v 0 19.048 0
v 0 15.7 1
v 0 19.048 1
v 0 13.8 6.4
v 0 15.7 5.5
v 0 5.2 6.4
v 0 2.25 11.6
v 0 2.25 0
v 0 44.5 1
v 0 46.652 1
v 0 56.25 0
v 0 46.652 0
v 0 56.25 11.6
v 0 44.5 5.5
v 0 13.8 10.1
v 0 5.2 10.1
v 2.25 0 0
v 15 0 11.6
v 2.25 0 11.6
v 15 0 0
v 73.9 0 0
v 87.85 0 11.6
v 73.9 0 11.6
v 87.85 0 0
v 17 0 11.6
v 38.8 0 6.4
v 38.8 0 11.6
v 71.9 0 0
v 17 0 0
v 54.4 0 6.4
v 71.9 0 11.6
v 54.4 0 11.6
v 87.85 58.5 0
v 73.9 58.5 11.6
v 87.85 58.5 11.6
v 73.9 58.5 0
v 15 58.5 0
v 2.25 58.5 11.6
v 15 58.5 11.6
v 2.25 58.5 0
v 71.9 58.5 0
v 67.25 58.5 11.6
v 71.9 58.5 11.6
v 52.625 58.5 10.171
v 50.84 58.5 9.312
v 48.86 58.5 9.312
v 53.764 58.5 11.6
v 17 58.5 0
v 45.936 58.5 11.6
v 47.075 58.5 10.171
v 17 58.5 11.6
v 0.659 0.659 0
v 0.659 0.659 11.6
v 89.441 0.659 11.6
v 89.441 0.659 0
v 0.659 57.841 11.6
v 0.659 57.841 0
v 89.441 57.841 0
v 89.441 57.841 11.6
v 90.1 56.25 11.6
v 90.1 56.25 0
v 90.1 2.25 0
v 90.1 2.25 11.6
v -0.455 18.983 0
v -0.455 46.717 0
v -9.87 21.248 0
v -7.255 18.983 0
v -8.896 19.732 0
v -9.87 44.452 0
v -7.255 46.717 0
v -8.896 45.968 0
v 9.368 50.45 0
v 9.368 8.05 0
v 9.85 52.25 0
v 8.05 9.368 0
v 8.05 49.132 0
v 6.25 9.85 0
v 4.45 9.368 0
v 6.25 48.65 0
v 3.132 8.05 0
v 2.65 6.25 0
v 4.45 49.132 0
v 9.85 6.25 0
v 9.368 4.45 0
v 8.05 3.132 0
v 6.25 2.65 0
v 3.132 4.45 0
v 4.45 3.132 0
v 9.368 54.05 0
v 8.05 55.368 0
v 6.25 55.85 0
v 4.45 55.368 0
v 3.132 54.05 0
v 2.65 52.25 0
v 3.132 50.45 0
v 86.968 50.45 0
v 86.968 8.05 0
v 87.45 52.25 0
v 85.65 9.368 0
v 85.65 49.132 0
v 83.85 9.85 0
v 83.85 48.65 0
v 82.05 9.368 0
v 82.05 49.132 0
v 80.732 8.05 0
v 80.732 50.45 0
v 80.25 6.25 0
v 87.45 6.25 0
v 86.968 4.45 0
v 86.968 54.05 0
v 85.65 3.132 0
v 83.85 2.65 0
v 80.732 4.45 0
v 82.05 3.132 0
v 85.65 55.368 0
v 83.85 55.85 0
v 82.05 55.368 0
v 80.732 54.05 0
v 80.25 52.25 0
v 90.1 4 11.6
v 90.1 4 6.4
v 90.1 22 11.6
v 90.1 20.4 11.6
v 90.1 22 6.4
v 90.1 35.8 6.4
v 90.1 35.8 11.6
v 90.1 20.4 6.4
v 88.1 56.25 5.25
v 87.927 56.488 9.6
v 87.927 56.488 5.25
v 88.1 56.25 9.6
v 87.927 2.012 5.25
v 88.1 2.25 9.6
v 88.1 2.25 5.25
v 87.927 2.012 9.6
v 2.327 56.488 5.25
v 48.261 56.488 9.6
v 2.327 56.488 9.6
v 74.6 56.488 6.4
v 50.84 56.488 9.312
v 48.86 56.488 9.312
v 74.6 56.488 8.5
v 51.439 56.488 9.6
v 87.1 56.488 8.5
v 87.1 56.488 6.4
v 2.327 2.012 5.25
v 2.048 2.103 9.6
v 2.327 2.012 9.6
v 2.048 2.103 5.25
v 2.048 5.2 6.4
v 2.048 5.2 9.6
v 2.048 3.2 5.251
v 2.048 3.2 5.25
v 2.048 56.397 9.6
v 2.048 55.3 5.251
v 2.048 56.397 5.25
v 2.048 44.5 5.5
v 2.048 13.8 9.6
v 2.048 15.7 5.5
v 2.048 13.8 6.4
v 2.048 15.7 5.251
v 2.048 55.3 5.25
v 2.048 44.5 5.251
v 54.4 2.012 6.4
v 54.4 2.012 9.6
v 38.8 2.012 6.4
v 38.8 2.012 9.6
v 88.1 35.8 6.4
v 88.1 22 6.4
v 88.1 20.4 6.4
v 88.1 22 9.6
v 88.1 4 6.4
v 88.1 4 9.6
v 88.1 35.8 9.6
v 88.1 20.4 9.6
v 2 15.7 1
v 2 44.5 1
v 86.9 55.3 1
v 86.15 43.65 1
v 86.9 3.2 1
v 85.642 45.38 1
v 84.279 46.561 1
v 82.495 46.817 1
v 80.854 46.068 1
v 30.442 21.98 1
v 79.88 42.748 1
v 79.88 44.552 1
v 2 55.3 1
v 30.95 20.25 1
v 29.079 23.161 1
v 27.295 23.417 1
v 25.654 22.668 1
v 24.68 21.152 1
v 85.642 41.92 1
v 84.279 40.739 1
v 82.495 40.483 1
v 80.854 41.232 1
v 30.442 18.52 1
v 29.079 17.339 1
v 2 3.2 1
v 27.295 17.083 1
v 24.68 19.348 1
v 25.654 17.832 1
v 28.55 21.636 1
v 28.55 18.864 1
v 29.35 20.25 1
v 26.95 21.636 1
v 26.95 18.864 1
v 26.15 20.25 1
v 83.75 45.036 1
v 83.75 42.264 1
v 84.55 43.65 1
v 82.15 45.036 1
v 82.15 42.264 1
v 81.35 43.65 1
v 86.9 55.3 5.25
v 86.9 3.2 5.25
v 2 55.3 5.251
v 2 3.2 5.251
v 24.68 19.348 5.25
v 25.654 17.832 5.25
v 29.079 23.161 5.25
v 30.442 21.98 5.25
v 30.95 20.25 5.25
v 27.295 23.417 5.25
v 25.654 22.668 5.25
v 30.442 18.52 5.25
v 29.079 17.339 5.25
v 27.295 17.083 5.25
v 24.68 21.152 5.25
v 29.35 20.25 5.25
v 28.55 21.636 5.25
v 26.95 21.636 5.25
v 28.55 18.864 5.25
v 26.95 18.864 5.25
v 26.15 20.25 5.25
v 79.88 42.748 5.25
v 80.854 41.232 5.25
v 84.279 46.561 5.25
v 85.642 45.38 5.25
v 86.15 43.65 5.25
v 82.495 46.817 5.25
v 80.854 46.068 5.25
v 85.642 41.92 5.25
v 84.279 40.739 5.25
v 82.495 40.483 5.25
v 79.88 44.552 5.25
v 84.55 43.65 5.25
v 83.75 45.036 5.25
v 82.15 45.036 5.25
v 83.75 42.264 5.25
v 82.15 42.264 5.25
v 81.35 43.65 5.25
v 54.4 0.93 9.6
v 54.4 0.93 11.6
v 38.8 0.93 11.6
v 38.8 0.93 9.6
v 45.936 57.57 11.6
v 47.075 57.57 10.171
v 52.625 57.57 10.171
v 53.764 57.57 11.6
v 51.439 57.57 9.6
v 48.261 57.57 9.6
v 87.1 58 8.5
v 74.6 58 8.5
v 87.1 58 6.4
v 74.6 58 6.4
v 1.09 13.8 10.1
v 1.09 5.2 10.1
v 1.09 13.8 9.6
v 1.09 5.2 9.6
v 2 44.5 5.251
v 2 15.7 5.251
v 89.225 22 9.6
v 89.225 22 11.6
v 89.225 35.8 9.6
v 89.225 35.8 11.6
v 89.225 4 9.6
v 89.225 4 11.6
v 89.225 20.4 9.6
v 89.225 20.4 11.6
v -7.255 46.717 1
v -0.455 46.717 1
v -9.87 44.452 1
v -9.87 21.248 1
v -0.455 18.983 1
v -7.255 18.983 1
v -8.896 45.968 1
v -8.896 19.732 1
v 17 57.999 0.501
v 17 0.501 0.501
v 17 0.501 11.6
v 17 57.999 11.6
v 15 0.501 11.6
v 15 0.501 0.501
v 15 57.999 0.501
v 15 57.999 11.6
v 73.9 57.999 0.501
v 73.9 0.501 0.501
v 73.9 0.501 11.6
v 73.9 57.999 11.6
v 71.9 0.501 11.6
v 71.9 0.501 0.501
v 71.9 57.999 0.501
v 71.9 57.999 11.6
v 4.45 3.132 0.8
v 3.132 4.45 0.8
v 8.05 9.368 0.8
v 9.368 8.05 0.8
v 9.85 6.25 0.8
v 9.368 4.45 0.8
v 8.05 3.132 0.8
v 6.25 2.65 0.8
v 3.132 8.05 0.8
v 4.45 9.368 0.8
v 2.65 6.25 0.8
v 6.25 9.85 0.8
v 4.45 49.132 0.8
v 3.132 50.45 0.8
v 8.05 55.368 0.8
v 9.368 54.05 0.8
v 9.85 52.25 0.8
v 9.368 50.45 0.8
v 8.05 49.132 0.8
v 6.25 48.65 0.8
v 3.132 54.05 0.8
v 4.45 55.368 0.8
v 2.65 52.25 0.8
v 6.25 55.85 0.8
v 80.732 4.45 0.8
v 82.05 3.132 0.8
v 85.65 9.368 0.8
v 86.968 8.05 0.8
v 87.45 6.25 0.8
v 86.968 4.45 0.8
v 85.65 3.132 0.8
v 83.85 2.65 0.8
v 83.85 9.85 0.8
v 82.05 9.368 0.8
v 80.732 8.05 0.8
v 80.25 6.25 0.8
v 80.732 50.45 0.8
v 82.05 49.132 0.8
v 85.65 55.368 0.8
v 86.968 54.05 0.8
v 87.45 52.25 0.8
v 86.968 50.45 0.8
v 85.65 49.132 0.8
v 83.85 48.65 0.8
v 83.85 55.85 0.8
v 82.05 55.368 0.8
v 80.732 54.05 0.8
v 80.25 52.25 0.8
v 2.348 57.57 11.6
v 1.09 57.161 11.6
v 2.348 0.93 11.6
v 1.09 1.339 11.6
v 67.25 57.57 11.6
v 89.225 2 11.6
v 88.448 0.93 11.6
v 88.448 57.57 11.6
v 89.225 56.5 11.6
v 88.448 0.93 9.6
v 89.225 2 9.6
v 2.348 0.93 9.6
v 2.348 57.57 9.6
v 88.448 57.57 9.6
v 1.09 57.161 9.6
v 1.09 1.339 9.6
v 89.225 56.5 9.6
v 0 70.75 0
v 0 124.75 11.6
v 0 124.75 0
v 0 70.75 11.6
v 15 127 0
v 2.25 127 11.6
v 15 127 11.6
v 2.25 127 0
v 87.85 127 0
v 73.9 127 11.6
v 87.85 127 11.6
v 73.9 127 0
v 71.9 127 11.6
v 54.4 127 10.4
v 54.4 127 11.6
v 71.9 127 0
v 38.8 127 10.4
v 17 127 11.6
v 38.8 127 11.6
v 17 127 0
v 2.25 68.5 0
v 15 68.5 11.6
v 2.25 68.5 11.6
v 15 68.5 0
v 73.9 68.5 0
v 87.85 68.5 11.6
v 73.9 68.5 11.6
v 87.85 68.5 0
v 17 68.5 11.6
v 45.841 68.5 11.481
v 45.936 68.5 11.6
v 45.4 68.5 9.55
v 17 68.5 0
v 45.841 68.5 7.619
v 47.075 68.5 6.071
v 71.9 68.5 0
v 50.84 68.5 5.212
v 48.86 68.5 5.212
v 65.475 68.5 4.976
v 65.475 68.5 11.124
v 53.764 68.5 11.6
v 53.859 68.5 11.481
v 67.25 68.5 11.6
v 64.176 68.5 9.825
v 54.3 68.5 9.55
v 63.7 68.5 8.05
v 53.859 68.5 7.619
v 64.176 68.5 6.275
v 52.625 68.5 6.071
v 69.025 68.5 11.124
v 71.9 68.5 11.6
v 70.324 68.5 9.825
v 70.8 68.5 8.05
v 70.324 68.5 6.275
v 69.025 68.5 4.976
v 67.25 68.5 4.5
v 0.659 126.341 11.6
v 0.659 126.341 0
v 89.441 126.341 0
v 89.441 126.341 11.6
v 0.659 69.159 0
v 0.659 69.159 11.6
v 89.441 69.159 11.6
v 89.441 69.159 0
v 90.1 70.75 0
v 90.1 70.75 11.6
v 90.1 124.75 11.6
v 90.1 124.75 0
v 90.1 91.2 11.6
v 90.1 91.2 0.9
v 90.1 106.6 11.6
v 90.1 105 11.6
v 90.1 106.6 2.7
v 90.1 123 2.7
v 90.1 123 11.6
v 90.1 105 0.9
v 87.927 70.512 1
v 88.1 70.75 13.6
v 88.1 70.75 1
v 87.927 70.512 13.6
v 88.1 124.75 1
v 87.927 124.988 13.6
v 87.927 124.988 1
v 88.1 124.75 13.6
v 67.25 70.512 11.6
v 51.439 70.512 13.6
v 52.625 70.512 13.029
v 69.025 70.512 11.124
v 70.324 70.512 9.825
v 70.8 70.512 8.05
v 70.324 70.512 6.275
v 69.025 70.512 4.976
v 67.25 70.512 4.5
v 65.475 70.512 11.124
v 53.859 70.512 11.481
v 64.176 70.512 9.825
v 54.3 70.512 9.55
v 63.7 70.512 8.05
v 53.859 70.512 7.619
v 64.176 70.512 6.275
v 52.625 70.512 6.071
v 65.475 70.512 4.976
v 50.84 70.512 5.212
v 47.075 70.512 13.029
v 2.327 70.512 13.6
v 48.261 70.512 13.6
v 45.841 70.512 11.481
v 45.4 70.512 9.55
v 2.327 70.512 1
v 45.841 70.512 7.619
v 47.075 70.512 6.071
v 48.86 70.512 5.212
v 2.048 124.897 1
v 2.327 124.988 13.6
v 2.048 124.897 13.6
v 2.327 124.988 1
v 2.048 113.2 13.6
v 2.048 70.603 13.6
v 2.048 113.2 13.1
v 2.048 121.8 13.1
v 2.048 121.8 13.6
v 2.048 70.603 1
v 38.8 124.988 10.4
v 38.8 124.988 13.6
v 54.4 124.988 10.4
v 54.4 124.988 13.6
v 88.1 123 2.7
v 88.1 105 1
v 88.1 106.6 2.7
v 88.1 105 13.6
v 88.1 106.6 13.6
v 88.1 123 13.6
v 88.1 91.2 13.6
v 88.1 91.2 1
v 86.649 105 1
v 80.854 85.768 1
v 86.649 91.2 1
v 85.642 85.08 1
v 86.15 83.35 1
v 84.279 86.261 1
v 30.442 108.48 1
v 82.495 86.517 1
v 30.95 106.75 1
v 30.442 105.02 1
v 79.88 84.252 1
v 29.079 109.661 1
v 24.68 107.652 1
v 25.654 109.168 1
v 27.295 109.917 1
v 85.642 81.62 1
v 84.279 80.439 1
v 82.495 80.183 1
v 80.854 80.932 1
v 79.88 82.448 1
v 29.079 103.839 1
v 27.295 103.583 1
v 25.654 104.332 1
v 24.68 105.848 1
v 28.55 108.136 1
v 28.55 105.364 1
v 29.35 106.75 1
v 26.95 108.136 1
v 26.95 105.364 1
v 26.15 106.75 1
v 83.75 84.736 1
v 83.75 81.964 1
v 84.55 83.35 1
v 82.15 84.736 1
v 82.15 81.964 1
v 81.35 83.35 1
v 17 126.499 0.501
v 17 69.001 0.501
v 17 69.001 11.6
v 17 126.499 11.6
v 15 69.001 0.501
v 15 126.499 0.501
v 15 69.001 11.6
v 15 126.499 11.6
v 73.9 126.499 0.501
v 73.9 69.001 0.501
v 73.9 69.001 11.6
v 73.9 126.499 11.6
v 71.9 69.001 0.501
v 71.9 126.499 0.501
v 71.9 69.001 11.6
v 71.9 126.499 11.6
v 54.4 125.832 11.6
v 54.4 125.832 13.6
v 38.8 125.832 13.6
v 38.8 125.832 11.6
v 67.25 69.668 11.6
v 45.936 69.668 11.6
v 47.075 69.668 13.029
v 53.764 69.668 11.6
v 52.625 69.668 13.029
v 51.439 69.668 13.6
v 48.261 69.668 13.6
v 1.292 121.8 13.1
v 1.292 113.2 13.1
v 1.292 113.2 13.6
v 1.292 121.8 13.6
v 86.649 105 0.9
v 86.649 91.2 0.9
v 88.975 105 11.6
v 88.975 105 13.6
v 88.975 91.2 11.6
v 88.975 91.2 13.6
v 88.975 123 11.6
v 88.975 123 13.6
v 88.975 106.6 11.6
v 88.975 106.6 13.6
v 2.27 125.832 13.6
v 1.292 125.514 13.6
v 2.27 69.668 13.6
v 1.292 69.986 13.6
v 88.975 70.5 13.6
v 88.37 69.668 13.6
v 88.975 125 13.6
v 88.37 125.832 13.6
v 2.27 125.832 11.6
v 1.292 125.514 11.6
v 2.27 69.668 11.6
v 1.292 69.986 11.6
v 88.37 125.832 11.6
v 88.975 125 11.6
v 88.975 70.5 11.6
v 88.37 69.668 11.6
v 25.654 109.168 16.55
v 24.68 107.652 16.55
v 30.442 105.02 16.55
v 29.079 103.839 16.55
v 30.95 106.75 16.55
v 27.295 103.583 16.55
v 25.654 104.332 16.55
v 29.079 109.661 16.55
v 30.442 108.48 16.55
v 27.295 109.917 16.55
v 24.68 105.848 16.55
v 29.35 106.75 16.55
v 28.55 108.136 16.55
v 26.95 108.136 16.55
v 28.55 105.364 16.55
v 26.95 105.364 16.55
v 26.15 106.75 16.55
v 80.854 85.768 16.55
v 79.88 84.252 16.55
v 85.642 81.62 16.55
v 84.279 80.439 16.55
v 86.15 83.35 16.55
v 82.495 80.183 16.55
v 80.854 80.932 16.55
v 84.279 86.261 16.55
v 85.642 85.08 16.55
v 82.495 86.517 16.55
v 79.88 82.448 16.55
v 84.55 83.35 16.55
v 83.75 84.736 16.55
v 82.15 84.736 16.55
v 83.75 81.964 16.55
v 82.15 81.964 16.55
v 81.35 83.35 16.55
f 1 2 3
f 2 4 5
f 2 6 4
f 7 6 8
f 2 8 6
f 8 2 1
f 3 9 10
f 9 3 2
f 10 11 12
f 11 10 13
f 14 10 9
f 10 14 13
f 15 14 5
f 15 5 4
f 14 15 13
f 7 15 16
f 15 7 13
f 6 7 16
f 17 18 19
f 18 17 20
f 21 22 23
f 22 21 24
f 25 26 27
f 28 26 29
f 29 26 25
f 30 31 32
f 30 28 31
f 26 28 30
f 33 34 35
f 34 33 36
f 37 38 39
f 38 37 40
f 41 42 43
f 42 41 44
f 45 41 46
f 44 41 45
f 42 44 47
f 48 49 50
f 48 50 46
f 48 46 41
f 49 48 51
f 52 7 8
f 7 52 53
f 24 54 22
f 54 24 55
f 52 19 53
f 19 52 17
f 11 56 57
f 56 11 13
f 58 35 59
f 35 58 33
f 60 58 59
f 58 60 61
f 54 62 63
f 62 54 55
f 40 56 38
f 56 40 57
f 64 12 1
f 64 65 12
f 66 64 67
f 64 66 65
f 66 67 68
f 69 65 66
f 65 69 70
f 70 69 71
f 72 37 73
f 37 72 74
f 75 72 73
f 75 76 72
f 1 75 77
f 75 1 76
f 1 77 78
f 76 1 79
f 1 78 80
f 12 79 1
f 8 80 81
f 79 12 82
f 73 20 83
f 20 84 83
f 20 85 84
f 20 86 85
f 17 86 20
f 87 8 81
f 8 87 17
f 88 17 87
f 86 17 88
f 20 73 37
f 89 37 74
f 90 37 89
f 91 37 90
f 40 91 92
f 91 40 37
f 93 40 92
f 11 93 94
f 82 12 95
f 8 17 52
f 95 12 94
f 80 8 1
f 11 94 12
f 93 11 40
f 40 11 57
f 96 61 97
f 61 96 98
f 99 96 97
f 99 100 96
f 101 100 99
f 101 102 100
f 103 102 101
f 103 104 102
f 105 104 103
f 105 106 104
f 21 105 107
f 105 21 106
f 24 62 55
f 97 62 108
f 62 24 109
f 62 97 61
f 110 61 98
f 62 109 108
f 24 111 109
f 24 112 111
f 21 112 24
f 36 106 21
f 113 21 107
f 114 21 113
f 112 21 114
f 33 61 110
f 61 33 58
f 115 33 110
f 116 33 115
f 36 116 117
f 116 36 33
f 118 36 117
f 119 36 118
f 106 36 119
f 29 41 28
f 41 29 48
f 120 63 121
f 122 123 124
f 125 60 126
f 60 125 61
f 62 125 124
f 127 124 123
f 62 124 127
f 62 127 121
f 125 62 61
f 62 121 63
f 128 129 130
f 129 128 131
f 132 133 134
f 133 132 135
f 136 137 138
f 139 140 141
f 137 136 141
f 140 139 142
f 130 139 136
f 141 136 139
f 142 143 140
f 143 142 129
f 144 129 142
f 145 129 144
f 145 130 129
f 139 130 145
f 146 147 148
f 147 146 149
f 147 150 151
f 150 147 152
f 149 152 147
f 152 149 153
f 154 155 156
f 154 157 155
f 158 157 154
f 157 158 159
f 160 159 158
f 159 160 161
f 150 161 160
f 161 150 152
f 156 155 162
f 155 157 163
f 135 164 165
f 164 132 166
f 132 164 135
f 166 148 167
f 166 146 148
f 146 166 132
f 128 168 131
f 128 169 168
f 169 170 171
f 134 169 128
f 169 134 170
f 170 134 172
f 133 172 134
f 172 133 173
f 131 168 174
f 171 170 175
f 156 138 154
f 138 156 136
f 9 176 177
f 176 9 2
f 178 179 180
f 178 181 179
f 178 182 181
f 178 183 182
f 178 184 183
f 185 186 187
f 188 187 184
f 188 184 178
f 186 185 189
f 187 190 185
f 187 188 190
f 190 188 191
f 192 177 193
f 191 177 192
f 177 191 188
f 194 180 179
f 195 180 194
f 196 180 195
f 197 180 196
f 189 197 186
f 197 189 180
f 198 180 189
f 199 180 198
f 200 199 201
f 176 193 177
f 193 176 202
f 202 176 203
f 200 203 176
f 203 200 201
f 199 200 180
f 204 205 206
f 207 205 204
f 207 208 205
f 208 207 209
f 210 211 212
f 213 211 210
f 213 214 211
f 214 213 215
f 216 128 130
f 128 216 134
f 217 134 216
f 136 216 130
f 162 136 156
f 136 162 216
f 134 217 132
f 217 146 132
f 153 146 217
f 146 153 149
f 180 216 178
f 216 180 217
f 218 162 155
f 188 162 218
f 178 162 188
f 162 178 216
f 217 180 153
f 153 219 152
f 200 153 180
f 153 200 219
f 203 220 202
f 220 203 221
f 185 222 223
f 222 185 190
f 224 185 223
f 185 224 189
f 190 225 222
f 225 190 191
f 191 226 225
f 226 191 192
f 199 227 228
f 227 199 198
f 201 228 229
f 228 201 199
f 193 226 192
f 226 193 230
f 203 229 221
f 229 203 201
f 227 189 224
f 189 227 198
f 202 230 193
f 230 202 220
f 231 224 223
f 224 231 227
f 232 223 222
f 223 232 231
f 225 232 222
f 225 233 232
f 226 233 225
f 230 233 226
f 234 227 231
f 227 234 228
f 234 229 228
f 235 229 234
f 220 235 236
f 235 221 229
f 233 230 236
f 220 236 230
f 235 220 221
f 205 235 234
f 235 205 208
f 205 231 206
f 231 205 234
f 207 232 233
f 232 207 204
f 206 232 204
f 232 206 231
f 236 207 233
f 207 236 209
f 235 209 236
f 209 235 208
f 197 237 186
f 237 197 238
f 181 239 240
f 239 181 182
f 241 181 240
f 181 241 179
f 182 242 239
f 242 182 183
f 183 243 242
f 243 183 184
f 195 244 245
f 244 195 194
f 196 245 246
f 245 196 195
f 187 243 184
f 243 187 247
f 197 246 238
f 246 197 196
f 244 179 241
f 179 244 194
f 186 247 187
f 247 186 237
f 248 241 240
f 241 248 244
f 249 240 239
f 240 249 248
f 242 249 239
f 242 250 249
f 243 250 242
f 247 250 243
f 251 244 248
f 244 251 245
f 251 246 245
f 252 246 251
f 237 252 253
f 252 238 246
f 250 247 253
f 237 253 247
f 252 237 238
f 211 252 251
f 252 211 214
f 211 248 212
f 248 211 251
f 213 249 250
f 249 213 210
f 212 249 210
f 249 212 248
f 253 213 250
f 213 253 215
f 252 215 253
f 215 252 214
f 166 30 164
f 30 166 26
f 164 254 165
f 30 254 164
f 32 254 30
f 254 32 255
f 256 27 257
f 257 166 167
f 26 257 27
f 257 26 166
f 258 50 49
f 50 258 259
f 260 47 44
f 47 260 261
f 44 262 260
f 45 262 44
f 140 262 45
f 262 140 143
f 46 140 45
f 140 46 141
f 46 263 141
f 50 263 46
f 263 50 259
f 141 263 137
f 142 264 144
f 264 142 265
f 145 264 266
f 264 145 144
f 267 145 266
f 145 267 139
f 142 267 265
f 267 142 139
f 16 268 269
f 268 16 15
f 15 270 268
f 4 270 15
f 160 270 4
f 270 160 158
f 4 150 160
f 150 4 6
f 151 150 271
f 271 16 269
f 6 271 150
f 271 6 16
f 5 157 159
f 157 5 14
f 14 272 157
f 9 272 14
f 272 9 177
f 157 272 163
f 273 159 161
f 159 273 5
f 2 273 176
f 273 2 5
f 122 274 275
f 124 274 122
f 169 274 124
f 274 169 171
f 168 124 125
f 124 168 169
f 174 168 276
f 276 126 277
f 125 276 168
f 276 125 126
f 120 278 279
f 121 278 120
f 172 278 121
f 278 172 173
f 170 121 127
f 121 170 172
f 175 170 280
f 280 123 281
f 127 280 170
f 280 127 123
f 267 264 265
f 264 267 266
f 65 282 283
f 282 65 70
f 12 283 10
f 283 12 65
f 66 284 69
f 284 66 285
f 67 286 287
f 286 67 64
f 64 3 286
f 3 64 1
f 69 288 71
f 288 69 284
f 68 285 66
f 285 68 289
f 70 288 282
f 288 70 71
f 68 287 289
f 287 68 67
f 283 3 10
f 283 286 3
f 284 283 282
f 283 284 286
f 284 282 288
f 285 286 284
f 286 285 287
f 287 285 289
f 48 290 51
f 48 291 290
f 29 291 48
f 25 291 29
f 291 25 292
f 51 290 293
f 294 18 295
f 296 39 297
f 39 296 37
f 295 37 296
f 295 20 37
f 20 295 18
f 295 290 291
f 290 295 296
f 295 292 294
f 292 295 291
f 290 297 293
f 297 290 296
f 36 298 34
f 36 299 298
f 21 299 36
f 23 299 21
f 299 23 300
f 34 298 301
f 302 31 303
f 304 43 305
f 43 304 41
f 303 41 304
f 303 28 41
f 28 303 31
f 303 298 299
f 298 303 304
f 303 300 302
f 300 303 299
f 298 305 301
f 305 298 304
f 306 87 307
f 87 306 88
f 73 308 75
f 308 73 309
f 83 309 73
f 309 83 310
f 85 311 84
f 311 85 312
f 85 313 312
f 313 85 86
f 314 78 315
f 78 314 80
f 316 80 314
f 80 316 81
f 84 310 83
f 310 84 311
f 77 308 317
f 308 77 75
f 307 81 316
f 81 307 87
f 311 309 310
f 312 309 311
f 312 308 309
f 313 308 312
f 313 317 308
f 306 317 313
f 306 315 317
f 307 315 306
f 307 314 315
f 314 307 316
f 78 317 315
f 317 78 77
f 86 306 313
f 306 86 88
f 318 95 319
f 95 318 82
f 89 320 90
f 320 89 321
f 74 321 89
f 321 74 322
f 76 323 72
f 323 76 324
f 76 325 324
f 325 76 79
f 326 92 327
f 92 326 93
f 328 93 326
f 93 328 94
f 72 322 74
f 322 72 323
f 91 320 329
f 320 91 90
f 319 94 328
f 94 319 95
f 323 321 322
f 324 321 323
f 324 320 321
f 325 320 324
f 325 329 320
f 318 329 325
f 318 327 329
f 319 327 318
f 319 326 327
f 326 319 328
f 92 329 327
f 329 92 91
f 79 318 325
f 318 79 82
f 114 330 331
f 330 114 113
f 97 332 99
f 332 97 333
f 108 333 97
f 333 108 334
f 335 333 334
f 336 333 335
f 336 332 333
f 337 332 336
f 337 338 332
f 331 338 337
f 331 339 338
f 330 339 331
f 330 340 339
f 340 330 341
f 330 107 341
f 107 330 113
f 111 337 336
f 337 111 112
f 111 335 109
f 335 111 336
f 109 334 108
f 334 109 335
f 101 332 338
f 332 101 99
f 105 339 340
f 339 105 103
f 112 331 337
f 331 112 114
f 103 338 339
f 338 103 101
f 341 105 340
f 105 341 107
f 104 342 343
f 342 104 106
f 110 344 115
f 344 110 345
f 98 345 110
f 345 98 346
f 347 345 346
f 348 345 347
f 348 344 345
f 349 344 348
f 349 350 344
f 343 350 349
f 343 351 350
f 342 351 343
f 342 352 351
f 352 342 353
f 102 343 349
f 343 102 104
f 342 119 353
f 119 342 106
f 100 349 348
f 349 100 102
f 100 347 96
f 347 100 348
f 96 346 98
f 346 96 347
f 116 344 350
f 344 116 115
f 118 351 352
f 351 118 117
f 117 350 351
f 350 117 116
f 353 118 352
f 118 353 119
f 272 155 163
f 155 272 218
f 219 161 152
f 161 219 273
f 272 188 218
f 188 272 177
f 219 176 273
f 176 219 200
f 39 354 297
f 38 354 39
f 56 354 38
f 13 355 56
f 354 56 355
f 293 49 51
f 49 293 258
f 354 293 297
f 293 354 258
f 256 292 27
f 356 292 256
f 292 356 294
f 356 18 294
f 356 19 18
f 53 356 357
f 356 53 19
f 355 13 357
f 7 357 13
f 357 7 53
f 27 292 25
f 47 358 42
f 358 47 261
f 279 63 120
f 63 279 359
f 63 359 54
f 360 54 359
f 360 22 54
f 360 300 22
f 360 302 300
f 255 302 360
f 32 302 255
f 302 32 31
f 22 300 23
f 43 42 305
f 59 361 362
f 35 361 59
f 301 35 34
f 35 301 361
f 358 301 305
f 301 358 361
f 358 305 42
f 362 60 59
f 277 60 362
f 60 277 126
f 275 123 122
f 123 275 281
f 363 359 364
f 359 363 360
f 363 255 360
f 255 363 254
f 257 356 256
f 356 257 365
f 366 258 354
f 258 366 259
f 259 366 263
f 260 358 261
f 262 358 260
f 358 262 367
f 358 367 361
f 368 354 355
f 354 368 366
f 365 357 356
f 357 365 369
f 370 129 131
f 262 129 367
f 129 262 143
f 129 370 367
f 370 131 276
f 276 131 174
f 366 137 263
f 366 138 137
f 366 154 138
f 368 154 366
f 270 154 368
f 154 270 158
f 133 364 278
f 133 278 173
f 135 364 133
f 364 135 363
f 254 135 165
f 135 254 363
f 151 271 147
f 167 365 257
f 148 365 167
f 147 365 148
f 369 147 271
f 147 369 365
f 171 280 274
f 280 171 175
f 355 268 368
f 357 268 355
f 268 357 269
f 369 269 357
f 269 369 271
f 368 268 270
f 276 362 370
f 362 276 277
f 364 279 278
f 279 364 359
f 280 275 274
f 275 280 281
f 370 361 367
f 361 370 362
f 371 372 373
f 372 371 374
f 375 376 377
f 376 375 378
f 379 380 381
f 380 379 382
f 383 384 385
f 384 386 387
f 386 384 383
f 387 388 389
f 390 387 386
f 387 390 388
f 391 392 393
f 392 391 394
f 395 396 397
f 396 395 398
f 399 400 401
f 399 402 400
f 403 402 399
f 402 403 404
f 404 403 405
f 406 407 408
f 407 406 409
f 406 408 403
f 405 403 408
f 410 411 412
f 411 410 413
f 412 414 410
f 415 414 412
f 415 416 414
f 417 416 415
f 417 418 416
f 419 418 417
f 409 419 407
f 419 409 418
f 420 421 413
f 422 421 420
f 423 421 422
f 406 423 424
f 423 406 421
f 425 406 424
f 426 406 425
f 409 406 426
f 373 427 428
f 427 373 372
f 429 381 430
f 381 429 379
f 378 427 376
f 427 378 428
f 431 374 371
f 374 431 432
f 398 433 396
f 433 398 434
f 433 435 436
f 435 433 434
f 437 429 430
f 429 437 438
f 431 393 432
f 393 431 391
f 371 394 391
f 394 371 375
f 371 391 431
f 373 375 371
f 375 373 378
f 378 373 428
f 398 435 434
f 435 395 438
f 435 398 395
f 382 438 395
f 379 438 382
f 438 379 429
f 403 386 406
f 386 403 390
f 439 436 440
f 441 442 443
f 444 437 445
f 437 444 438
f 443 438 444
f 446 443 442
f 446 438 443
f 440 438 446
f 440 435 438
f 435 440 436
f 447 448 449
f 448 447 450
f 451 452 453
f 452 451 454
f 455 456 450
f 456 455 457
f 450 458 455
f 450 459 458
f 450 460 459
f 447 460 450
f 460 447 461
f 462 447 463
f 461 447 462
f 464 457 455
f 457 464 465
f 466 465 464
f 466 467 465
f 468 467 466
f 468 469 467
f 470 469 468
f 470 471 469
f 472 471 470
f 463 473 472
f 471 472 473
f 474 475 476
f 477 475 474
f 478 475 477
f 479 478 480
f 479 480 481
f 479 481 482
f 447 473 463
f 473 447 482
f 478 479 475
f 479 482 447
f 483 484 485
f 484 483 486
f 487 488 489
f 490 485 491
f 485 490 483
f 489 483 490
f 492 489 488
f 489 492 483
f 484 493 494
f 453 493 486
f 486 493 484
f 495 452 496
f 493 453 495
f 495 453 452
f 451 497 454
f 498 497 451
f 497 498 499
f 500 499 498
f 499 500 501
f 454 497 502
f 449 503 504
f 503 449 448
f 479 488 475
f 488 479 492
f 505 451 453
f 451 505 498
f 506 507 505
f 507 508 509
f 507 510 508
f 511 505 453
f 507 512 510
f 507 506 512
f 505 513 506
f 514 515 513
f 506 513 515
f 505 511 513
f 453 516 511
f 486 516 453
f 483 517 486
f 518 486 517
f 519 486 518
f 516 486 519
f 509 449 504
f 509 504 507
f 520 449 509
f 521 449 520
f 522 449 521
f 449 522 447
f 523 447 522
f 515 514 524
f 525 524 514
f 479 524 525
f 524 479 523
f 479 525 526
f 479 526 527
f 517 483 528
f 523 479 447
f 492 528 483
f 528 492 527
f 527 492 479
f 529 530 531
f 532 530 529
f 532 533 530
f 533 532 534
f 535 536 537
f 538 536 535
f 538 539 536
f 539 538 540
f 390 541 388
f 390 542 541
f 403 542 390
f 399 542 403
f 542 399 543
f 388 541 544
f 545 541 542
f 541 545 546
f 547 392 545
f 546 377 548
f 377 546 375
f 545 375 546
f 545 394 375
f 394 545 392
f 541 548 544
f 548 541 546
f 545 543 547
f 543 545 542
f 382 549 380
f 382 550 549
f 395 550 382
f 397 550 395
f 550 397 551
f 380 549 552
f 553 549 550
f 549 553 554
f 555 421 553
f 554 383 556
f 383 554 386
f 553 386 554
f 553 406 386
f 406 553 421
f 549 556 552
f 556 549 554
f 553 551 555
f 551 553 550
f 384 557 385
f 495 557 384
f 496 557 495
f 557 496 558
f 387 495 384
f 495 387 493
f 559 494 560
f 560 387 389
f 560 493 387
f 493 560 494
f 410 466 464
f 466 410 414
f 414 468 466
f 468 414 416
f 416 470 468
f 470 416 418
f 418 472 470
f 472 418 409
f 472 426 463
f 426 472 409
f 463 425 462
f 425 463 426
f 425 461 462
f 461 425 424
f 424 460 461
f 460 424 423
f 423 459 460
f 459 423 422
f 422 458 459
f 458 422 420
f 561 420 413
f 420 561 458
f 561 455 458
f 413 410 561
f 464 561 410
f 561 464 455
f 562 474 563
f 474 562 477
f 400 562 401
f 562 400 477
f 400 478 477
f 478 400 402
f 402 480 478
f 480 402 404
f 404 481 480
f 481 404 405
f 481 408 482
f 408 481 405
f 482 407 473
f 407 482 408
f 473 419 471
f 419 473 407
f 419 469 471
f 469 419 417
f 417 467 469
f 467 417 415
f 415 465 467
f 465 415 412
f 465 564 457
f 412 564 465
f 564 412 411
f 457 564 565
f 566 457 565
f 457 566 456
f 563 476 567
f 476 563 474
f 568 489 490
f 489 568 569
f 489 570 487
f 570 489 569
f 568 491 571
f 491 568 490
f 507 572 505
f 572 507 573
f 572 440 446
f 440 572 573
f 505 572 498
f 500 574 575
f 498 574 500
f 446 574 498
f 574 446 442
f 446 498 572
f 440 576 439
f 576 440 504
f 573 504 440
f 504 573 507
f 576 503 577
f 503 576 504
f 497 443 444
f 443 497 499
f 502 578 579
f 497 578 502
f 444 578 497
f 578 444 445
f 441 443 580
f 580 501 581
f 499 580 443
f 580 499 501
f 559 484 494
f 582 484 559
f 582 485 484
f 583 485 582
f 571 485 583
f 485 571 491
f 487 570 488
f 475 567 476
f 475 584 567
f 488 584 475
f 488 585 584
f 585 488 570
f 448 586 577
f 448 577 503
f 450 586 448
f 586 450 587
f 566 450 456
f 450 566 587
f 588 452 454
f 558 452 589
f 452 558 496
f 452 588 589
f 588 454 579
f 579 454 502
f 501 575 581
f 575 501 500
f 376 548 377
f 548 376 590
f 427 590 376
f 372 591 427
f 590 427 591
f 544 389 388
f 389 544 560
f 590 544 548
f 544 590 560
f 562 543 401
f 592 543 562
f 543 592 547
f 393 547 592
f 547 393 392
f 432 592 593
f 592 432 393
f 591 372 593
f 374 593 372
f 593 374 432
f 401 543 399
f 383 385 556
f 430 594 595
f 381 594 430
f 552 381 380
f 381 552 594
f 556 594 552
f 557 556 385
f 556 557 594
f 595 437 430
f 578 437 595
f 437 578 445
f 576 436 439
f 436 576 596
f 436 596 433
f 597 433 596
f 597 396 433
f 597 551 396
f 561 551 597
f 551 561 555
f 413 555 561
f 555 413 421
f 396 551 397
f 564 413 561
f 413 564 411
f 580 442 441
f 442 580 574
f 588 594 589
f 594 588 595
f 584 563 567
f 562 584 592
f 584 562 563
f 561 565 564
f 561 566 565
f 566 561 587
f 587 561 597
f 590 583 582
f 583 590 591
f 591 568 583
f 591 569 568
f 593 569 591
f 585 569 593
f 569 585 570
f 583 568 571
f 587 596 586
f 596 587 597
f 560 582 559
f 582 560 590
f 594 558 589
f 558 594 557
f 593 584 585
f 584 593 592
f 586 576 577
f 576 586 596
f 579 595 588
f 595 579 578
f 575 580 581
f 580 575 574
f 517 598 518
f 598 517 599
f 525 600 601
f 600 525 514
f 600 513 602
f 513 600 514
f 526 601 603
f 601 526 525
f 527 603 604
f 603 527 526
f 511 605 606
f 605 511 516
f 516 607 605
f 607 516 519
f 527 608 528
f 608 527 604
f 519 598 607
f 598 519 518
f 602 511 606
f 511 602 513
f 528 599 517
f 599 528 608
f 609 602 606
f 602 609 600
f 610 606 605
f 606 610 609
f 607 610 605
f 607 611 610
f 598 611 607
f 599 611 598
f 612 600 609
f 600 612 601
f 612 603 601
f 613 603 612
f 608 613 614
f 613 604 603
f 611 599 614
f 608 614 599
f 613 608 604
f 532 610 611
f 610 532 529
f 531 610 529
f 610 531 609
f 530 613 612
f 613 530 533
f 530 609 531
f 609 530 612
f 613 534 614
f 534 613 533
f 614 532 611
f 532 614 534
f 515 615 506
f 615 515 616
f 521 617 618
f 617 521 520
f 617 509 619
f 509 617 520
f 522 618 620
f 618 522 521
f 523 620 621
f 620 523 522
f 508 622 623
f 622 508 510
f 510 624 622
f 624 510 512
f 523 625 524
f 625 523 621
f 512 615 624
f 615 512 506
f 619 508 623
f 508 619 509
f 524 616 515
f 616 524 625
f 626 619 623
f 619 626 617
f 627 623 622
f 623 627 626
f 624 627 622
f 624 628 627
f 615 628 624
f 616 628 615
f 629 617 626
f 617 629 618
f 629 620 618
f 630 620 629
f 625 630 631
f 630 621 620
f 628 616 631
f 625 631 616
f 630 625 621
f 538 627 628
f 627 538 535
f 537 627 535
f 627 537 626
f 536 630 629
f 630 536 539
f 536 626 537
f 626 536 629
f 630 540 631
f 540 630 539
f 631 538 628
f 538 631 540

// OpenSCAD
// file: lib_metric_sizes.scad
m2   = 2.8;
m2_5 = 3.2;
m3   = 3.6;
m4   = 4.8;
m5   = 5.6;
m6   = 6.4;
// file: lib_nuts.scad
include <lib_metric_sizes.scad>

m2_nut = [5.2, 1.7];
m3_nut = [6.8, 2.3];
m4_nut = [8.4, 2.8];

m2_flat_nut = [5.2, 2.0];
m3_flat_nut = [6.8, 2.0];
m4_flat_nut = [8.4, 2.0];

//m2_nylon_nut = [, ];
//m2_5_nylon_nut = [, ];
//m3_nylon_nut = [, ];
m4_nylon_nut = [8.4, 3.3];
m5_nylon_nut = [10.0, 4.0];
m6_nylon_nut = [12.4, 5.0];
// file: lib_self_tapping_screws.scad
include <lib_metric_sizes.scad>

m3_st_roundhead = [7.2, 2.0];
m3_st_flathead = [7.2, 0];
// file: lib_machine_screws.scad
include <lib_metric_sizes.scad>

m2x12_shaft = [m2, 12.0];
m2x19_shaft = [m2, 19.0];
m3x12_shaft = [m3, 12.0];
m3x17_shaft = [m3, 17.0];
m3x19_shaft = [m3, 19.0];
m4x12_shaft = [m4, 12.0];
m4x25_shaft = [m4, 25.0];

m2_roundhead = [4.0, 1.0];
m3_roundhead = [5.6, 1.7];
m4_roundhead = [7.2, 2.3];

m2_flathead = [4.0, 1.0];
m3_flathead = [5.6, 1.0];
m4_flathead = [7.2, 1.0];
// file: lib_gadgets.scad
include <lib_machine_screws.scad>
include <lib_self_tapping_screws.scad>
include <lib_nuts.scad>

module stud(shaft, self_tapping=false)
{
	ds = self_tapping ? shaft[0]-0.4 : shaft[0];
	
	cylinder(h=shaft[1], d=ds);
}

module bolt(head, shaft, countersink=false, self_tapping=false) {
	ds = self_tapping ? shaft[0]-0.4 : shaft[0];
	
	cylinder(h=head[1], d=head[0]);
	cylinder(h=shaft[1]+head[1], d=ds);
	if (countersink == true) {
		translate([0, 0, head[1]]) {
			cylinder(h=head[0], d1=head[0], d2=0);
		}
	}
}

module nut(head, countersink=false) {
	cylinder(h=head[1], d=head[0], $fn=6);
	if (countersink == true) {
		translate([0, 0, head[1]]) {
			cylinder(h=head[0], d1=head[0], d2=0, $fn=6);
		}
	}
}

module post(pos, radius, height) {
	translate([pos[0], pos[1], 0]) { 
		cylinder(h=height, r=radius); 
	}
}

module spacer(pos, outer_r, inner_r, height) {
	translate([pos[0], pos[1], 0]) { 
		difference() {
			cylinder(h=height, r=outer_r); 
			if (inner_r > 0) {
				cylinder(h=height+0.0001, r=inner_r); 
			}
		}
	}
}

module grid(size, xx, yy) {
	if (size > 0) {
		for (x = [0 : size : xx] ) {
			translate([x, 0, 0]) cube([0.8, yy, 0.4]);
		}
		for (y = [0 : size : yy] ) {
			translate([0, y, 0]) cube([xx, 0.8, 0.4]);
		}
	}
}
// file: lib_soft.scad
/** 
 * An OpenSCAD library for creating shapes with rounded edges
 *
 * @author Paul Generes <paul.generes@gmail.com>
 * @example soft_example.scad
 */
 
module soft_cube(size=[1, 1, 1], center=false, cr=1) {
	tr = [cr, cr, cr];

    translate(tr) {
        minkowski() {
            sphere(cr);
            cube([size[0]-2*cr, size[1]-2*cr, size[2]-2*cr], center);
        }
    }
}

module softxyz_cube(size=1, center=false, cr=[1, 1, 1]) {
	tr = cr;

    translate(tr) {
        minkowski() {
			scale(cr) {
				sphere(1);
			}
            cube([size[0]-2*cr[0], size[1]-2*cr[1], size[2]-2*cr[2]], center);
        }
    }
}

module softz_cube(size=1, center=false, cr=1) {
	tr = [cr, cr, 0];

    translate(tr) {
        minkowski() {
			cylinder(h=0.00001, r=cr);
			cube([size[0]-2*cr, size[1]-2*cr, size[2]-0.00001], center);
        }
    }
}
// file: lib_raspi_b_enclosure.scad
// Raspberry Pi Model B Enclosure Library

/*
Board: 85 x 54 x 1.5
Right:
	RJ45: 15.9 x 13.6 @ 2, 1.5
	USB: 13.3 x 15.4 @ 20, 1.5
Left:
	SD Card Slot:  28.3 x 4, @ 12, -4
	Micro USB: 8.1 x 3.2 @ 42.7 , 1.5
Front:
	HDMI: 15.1 x 5.9 @ 36.8, 1.5
Back:
	Audio Jack: 6.6 @ 20.6, 8.5
	Composite Video: 8.4 @ 38, 7
*/


include <lib_enclosure.scad>

// variables
function fillet_z()         = 0;
function tolerance()        = 0.25;
function device_x()         = 85.6;
function device_y()         = 54.0;
function pcb_z()            = 1.4;
function spacing()          = 10.0;
function riser_z()          = 4.0;
function riser_thickness()  = 1.2;
function wall_thickness()   = 2;
function bottom_thickness() = 1;
function top_thickness()    = 1;
function device_z()         = pcb_z() + 15.3;
function friction()         = wall_thickness();
function split()            = outer_z() / 2;

module right_cutouts(is_bottom) {
	square_cutout([2.0+15.9/2,       pcb_z()+13.6/2], [15.9, 13.6]); // rj45 (15.9x13 @ 2x1.4)
	square_cutout([20+13.3/2, pcb_z()+15.4/2], [13.3, 15.4]); // usb

	extra_right_cutouts(is_bottom);
}

module left_cutouts(is_bottom) {
	square_cutout([12+28.3/2,  -4/2],        [28.3,     4]);   // sd card
	square_cutout([42.7+8.1/2, pcb_z()+3.2/2], [8.1,   3.2]); // power

	extra_left_cutouts(is_bottom);
}

module front_cutouts(is_bottom) {
	square_cutout([36.8+15.1/2, pcb_z()+5.9/2], [15.1, 5.9]); // hdmi

	if (is_bottom) {
		square_cutout([36.8+15.1/2, pcb_z()+device_z()/2], [15.1, device_z()]); // hdmi
	}

	extra_front_cutouts(is_bottom);
}

module back_cutouts(is_bottom) {
	circle_cutout([20.6, pcb_z()+8.5], 6.6/2); // audio
	circle_cutout([38, pcb_z()+7],     8.4/2); // video
	//circle_cutout([85.0-40.6-9.8/2-1.0, pcb_z()+6.5],       8.3/2+1); // video (is this for the older b?)
	//translate([50.80,          4], [33.20,          20.00]); // gpio header
	//translate([46.00,          4], [            50.00,          20.00]); // gpio ribbon
	//translate([50.80,          4], [ 33.2, 10]); // little gpio ribbon

	if (is_bottom) {
		//square_cutout([14.0+12.0/2,         pcb_z()+3.0+6.7/2+device_z()/2+0.5], [6.7+2, device_z()]); // audio
		//square_cutout([85.0-40.6-9.8/2-1.0, pcb_z()+4.0+8.3/2+device_z()/2],     [8.3+2, device_z()]); // video
		//square_cutout([85.0-40.6-9.8/2-1.0, pcb_z()+6.5-8.3/2], [8.3+2, 8.3+2]); // video (is this for the older b?)
	} else {
		//square_cutout([14.0+12.0/2,         pcb_z()+3.0+6.7/2+0.5-device_z()/2], [6.7+2, device_z()]); // audio
		//square_cutout([85.0-40.6-9.8/2-1.0, pcb_z()+4.0+8.3/2-device_z()/2],     [8.3+2, device_z()]); // video
		//square_cutout([85.0-40.6-9.8/2-1.0, pcb_z()+6.5-8.3/2], [8.3+2, 8.3+2]); // video (is this for the older b?)
	}

	extra_back_cutouts(is_bottom);
}

module top_cutouts() {
	//translate([                        19.00,           71.00], [              18.00,             1.50]); // dsi
	//translate([                         2.00,           25.00], [              18.00,             1.50]); // csi
	//translate([                  2,    -1], [   15.4, 21.2]); // rj45 (for super short enclosures)
	//square_cutout([device_y-18.8-13.25,  -7.7], [  13.25, 17.2]); // usb (for super short enclosures)
	//translate([      device_y-11.4,    14], [ 11.4+4,   12]); // audio (for super short enclosures)
	//translate([    device_y-2.1-10,    34], [ 10+2.1,   10]); // video (for super short enclosures)
	//translate([              49.00, 50.80], [5.5+1.5, 33.2]); // gpio header
	//translate([              49.00, 46.00], [5.5+1.5,               50]); // gpio ribbon

	extra_top_cutouts();
}

module bottom_cutouts() {
	extra_bottom_cutouts();
}

module cutouts(is_bottom) {
	// Cut away the riser adjacent to the SD card bracket.
	translate([wall_thickness(), wall_thickness()+riser_thickness(), bottom_thickness()])
	    cube([riser_thickness()+0.0001, inner_y()-2*riser_thickness(), triser_z()+0.001]);

	extra_cutouts(is_bottom);
}

module feet(pos) {
	bottom_face() {
		translate([pos,            pos, 0])            cylinder(h=0.8, r=3.6);
		translate([pos,            device_y()-pos, 0]) cylinder(h=0.8, r=3.6);
		translate([device_x()-pos, pos, 0])            cylinder(h=0.8, r=3.6);
		translate([device_x()-pos, device_y()-pos, 0]) cylinder(h=0.8, r=3.6);
	}
}

module stand_offs() {
	stand_off([25.5,            18.0],             3.2, 1.6);
	stand_off([device_x()-4.90, device_y()-12.60], 3.2, 1.6);
}

module stand_ons() {
	stand_on([25.5,            18.0],             3.2, 1.6);
	stand_on([device_x()-4.90, device_y()-12.60], 3.2, 1.6);
}

module led_window() {
	square_cutout([ 1.0+12.0/2,         pcb_z()+1.6/2],         [12.00, 1.6]);
}

module attachments() {}
module final_attachments() {}

module extra_front_cutouts(){}
module extra_back_cutouts(){}
module extra_left_cutouts(){}
module extra_right_cutouts(){}
module extra_top_cutouts(){}
module extra_bottom_cutouts(){}
module extra_cutouts(){}
// main file
// example raspberry pi model b

include <lib_raspi_b_enclosure.scad>

enclosure();

module extra_cutouts() {
	rubber_band_grooves();
	feet(4.0);
}

module extra_back_cutouts() {
	led_window();
}

module rubber_band_grooves() {
	rubber_band_y(2, 0.5,               15.0);
	rubber_band_y(2, 0.5, outer_x()-3.2-15.0);
}

module attachments() {
	back_face() {
		// Translucent layer over the led window
		translate([0, 0, 0]) cube([14.00, 4, 0.5]);
	}
	// SD Card guard
	translate([-10.0, 56.0+2*twall_thickness()-27.8-twall_thickness()-11.5, 0]) softz_cube([10.0+3.2, 27.8, bottom_thickness()], cr=3.2);
}

module final_attachments(is_bottom) {
	if (!is_bottom) {
		stand_ons();
	}
}
